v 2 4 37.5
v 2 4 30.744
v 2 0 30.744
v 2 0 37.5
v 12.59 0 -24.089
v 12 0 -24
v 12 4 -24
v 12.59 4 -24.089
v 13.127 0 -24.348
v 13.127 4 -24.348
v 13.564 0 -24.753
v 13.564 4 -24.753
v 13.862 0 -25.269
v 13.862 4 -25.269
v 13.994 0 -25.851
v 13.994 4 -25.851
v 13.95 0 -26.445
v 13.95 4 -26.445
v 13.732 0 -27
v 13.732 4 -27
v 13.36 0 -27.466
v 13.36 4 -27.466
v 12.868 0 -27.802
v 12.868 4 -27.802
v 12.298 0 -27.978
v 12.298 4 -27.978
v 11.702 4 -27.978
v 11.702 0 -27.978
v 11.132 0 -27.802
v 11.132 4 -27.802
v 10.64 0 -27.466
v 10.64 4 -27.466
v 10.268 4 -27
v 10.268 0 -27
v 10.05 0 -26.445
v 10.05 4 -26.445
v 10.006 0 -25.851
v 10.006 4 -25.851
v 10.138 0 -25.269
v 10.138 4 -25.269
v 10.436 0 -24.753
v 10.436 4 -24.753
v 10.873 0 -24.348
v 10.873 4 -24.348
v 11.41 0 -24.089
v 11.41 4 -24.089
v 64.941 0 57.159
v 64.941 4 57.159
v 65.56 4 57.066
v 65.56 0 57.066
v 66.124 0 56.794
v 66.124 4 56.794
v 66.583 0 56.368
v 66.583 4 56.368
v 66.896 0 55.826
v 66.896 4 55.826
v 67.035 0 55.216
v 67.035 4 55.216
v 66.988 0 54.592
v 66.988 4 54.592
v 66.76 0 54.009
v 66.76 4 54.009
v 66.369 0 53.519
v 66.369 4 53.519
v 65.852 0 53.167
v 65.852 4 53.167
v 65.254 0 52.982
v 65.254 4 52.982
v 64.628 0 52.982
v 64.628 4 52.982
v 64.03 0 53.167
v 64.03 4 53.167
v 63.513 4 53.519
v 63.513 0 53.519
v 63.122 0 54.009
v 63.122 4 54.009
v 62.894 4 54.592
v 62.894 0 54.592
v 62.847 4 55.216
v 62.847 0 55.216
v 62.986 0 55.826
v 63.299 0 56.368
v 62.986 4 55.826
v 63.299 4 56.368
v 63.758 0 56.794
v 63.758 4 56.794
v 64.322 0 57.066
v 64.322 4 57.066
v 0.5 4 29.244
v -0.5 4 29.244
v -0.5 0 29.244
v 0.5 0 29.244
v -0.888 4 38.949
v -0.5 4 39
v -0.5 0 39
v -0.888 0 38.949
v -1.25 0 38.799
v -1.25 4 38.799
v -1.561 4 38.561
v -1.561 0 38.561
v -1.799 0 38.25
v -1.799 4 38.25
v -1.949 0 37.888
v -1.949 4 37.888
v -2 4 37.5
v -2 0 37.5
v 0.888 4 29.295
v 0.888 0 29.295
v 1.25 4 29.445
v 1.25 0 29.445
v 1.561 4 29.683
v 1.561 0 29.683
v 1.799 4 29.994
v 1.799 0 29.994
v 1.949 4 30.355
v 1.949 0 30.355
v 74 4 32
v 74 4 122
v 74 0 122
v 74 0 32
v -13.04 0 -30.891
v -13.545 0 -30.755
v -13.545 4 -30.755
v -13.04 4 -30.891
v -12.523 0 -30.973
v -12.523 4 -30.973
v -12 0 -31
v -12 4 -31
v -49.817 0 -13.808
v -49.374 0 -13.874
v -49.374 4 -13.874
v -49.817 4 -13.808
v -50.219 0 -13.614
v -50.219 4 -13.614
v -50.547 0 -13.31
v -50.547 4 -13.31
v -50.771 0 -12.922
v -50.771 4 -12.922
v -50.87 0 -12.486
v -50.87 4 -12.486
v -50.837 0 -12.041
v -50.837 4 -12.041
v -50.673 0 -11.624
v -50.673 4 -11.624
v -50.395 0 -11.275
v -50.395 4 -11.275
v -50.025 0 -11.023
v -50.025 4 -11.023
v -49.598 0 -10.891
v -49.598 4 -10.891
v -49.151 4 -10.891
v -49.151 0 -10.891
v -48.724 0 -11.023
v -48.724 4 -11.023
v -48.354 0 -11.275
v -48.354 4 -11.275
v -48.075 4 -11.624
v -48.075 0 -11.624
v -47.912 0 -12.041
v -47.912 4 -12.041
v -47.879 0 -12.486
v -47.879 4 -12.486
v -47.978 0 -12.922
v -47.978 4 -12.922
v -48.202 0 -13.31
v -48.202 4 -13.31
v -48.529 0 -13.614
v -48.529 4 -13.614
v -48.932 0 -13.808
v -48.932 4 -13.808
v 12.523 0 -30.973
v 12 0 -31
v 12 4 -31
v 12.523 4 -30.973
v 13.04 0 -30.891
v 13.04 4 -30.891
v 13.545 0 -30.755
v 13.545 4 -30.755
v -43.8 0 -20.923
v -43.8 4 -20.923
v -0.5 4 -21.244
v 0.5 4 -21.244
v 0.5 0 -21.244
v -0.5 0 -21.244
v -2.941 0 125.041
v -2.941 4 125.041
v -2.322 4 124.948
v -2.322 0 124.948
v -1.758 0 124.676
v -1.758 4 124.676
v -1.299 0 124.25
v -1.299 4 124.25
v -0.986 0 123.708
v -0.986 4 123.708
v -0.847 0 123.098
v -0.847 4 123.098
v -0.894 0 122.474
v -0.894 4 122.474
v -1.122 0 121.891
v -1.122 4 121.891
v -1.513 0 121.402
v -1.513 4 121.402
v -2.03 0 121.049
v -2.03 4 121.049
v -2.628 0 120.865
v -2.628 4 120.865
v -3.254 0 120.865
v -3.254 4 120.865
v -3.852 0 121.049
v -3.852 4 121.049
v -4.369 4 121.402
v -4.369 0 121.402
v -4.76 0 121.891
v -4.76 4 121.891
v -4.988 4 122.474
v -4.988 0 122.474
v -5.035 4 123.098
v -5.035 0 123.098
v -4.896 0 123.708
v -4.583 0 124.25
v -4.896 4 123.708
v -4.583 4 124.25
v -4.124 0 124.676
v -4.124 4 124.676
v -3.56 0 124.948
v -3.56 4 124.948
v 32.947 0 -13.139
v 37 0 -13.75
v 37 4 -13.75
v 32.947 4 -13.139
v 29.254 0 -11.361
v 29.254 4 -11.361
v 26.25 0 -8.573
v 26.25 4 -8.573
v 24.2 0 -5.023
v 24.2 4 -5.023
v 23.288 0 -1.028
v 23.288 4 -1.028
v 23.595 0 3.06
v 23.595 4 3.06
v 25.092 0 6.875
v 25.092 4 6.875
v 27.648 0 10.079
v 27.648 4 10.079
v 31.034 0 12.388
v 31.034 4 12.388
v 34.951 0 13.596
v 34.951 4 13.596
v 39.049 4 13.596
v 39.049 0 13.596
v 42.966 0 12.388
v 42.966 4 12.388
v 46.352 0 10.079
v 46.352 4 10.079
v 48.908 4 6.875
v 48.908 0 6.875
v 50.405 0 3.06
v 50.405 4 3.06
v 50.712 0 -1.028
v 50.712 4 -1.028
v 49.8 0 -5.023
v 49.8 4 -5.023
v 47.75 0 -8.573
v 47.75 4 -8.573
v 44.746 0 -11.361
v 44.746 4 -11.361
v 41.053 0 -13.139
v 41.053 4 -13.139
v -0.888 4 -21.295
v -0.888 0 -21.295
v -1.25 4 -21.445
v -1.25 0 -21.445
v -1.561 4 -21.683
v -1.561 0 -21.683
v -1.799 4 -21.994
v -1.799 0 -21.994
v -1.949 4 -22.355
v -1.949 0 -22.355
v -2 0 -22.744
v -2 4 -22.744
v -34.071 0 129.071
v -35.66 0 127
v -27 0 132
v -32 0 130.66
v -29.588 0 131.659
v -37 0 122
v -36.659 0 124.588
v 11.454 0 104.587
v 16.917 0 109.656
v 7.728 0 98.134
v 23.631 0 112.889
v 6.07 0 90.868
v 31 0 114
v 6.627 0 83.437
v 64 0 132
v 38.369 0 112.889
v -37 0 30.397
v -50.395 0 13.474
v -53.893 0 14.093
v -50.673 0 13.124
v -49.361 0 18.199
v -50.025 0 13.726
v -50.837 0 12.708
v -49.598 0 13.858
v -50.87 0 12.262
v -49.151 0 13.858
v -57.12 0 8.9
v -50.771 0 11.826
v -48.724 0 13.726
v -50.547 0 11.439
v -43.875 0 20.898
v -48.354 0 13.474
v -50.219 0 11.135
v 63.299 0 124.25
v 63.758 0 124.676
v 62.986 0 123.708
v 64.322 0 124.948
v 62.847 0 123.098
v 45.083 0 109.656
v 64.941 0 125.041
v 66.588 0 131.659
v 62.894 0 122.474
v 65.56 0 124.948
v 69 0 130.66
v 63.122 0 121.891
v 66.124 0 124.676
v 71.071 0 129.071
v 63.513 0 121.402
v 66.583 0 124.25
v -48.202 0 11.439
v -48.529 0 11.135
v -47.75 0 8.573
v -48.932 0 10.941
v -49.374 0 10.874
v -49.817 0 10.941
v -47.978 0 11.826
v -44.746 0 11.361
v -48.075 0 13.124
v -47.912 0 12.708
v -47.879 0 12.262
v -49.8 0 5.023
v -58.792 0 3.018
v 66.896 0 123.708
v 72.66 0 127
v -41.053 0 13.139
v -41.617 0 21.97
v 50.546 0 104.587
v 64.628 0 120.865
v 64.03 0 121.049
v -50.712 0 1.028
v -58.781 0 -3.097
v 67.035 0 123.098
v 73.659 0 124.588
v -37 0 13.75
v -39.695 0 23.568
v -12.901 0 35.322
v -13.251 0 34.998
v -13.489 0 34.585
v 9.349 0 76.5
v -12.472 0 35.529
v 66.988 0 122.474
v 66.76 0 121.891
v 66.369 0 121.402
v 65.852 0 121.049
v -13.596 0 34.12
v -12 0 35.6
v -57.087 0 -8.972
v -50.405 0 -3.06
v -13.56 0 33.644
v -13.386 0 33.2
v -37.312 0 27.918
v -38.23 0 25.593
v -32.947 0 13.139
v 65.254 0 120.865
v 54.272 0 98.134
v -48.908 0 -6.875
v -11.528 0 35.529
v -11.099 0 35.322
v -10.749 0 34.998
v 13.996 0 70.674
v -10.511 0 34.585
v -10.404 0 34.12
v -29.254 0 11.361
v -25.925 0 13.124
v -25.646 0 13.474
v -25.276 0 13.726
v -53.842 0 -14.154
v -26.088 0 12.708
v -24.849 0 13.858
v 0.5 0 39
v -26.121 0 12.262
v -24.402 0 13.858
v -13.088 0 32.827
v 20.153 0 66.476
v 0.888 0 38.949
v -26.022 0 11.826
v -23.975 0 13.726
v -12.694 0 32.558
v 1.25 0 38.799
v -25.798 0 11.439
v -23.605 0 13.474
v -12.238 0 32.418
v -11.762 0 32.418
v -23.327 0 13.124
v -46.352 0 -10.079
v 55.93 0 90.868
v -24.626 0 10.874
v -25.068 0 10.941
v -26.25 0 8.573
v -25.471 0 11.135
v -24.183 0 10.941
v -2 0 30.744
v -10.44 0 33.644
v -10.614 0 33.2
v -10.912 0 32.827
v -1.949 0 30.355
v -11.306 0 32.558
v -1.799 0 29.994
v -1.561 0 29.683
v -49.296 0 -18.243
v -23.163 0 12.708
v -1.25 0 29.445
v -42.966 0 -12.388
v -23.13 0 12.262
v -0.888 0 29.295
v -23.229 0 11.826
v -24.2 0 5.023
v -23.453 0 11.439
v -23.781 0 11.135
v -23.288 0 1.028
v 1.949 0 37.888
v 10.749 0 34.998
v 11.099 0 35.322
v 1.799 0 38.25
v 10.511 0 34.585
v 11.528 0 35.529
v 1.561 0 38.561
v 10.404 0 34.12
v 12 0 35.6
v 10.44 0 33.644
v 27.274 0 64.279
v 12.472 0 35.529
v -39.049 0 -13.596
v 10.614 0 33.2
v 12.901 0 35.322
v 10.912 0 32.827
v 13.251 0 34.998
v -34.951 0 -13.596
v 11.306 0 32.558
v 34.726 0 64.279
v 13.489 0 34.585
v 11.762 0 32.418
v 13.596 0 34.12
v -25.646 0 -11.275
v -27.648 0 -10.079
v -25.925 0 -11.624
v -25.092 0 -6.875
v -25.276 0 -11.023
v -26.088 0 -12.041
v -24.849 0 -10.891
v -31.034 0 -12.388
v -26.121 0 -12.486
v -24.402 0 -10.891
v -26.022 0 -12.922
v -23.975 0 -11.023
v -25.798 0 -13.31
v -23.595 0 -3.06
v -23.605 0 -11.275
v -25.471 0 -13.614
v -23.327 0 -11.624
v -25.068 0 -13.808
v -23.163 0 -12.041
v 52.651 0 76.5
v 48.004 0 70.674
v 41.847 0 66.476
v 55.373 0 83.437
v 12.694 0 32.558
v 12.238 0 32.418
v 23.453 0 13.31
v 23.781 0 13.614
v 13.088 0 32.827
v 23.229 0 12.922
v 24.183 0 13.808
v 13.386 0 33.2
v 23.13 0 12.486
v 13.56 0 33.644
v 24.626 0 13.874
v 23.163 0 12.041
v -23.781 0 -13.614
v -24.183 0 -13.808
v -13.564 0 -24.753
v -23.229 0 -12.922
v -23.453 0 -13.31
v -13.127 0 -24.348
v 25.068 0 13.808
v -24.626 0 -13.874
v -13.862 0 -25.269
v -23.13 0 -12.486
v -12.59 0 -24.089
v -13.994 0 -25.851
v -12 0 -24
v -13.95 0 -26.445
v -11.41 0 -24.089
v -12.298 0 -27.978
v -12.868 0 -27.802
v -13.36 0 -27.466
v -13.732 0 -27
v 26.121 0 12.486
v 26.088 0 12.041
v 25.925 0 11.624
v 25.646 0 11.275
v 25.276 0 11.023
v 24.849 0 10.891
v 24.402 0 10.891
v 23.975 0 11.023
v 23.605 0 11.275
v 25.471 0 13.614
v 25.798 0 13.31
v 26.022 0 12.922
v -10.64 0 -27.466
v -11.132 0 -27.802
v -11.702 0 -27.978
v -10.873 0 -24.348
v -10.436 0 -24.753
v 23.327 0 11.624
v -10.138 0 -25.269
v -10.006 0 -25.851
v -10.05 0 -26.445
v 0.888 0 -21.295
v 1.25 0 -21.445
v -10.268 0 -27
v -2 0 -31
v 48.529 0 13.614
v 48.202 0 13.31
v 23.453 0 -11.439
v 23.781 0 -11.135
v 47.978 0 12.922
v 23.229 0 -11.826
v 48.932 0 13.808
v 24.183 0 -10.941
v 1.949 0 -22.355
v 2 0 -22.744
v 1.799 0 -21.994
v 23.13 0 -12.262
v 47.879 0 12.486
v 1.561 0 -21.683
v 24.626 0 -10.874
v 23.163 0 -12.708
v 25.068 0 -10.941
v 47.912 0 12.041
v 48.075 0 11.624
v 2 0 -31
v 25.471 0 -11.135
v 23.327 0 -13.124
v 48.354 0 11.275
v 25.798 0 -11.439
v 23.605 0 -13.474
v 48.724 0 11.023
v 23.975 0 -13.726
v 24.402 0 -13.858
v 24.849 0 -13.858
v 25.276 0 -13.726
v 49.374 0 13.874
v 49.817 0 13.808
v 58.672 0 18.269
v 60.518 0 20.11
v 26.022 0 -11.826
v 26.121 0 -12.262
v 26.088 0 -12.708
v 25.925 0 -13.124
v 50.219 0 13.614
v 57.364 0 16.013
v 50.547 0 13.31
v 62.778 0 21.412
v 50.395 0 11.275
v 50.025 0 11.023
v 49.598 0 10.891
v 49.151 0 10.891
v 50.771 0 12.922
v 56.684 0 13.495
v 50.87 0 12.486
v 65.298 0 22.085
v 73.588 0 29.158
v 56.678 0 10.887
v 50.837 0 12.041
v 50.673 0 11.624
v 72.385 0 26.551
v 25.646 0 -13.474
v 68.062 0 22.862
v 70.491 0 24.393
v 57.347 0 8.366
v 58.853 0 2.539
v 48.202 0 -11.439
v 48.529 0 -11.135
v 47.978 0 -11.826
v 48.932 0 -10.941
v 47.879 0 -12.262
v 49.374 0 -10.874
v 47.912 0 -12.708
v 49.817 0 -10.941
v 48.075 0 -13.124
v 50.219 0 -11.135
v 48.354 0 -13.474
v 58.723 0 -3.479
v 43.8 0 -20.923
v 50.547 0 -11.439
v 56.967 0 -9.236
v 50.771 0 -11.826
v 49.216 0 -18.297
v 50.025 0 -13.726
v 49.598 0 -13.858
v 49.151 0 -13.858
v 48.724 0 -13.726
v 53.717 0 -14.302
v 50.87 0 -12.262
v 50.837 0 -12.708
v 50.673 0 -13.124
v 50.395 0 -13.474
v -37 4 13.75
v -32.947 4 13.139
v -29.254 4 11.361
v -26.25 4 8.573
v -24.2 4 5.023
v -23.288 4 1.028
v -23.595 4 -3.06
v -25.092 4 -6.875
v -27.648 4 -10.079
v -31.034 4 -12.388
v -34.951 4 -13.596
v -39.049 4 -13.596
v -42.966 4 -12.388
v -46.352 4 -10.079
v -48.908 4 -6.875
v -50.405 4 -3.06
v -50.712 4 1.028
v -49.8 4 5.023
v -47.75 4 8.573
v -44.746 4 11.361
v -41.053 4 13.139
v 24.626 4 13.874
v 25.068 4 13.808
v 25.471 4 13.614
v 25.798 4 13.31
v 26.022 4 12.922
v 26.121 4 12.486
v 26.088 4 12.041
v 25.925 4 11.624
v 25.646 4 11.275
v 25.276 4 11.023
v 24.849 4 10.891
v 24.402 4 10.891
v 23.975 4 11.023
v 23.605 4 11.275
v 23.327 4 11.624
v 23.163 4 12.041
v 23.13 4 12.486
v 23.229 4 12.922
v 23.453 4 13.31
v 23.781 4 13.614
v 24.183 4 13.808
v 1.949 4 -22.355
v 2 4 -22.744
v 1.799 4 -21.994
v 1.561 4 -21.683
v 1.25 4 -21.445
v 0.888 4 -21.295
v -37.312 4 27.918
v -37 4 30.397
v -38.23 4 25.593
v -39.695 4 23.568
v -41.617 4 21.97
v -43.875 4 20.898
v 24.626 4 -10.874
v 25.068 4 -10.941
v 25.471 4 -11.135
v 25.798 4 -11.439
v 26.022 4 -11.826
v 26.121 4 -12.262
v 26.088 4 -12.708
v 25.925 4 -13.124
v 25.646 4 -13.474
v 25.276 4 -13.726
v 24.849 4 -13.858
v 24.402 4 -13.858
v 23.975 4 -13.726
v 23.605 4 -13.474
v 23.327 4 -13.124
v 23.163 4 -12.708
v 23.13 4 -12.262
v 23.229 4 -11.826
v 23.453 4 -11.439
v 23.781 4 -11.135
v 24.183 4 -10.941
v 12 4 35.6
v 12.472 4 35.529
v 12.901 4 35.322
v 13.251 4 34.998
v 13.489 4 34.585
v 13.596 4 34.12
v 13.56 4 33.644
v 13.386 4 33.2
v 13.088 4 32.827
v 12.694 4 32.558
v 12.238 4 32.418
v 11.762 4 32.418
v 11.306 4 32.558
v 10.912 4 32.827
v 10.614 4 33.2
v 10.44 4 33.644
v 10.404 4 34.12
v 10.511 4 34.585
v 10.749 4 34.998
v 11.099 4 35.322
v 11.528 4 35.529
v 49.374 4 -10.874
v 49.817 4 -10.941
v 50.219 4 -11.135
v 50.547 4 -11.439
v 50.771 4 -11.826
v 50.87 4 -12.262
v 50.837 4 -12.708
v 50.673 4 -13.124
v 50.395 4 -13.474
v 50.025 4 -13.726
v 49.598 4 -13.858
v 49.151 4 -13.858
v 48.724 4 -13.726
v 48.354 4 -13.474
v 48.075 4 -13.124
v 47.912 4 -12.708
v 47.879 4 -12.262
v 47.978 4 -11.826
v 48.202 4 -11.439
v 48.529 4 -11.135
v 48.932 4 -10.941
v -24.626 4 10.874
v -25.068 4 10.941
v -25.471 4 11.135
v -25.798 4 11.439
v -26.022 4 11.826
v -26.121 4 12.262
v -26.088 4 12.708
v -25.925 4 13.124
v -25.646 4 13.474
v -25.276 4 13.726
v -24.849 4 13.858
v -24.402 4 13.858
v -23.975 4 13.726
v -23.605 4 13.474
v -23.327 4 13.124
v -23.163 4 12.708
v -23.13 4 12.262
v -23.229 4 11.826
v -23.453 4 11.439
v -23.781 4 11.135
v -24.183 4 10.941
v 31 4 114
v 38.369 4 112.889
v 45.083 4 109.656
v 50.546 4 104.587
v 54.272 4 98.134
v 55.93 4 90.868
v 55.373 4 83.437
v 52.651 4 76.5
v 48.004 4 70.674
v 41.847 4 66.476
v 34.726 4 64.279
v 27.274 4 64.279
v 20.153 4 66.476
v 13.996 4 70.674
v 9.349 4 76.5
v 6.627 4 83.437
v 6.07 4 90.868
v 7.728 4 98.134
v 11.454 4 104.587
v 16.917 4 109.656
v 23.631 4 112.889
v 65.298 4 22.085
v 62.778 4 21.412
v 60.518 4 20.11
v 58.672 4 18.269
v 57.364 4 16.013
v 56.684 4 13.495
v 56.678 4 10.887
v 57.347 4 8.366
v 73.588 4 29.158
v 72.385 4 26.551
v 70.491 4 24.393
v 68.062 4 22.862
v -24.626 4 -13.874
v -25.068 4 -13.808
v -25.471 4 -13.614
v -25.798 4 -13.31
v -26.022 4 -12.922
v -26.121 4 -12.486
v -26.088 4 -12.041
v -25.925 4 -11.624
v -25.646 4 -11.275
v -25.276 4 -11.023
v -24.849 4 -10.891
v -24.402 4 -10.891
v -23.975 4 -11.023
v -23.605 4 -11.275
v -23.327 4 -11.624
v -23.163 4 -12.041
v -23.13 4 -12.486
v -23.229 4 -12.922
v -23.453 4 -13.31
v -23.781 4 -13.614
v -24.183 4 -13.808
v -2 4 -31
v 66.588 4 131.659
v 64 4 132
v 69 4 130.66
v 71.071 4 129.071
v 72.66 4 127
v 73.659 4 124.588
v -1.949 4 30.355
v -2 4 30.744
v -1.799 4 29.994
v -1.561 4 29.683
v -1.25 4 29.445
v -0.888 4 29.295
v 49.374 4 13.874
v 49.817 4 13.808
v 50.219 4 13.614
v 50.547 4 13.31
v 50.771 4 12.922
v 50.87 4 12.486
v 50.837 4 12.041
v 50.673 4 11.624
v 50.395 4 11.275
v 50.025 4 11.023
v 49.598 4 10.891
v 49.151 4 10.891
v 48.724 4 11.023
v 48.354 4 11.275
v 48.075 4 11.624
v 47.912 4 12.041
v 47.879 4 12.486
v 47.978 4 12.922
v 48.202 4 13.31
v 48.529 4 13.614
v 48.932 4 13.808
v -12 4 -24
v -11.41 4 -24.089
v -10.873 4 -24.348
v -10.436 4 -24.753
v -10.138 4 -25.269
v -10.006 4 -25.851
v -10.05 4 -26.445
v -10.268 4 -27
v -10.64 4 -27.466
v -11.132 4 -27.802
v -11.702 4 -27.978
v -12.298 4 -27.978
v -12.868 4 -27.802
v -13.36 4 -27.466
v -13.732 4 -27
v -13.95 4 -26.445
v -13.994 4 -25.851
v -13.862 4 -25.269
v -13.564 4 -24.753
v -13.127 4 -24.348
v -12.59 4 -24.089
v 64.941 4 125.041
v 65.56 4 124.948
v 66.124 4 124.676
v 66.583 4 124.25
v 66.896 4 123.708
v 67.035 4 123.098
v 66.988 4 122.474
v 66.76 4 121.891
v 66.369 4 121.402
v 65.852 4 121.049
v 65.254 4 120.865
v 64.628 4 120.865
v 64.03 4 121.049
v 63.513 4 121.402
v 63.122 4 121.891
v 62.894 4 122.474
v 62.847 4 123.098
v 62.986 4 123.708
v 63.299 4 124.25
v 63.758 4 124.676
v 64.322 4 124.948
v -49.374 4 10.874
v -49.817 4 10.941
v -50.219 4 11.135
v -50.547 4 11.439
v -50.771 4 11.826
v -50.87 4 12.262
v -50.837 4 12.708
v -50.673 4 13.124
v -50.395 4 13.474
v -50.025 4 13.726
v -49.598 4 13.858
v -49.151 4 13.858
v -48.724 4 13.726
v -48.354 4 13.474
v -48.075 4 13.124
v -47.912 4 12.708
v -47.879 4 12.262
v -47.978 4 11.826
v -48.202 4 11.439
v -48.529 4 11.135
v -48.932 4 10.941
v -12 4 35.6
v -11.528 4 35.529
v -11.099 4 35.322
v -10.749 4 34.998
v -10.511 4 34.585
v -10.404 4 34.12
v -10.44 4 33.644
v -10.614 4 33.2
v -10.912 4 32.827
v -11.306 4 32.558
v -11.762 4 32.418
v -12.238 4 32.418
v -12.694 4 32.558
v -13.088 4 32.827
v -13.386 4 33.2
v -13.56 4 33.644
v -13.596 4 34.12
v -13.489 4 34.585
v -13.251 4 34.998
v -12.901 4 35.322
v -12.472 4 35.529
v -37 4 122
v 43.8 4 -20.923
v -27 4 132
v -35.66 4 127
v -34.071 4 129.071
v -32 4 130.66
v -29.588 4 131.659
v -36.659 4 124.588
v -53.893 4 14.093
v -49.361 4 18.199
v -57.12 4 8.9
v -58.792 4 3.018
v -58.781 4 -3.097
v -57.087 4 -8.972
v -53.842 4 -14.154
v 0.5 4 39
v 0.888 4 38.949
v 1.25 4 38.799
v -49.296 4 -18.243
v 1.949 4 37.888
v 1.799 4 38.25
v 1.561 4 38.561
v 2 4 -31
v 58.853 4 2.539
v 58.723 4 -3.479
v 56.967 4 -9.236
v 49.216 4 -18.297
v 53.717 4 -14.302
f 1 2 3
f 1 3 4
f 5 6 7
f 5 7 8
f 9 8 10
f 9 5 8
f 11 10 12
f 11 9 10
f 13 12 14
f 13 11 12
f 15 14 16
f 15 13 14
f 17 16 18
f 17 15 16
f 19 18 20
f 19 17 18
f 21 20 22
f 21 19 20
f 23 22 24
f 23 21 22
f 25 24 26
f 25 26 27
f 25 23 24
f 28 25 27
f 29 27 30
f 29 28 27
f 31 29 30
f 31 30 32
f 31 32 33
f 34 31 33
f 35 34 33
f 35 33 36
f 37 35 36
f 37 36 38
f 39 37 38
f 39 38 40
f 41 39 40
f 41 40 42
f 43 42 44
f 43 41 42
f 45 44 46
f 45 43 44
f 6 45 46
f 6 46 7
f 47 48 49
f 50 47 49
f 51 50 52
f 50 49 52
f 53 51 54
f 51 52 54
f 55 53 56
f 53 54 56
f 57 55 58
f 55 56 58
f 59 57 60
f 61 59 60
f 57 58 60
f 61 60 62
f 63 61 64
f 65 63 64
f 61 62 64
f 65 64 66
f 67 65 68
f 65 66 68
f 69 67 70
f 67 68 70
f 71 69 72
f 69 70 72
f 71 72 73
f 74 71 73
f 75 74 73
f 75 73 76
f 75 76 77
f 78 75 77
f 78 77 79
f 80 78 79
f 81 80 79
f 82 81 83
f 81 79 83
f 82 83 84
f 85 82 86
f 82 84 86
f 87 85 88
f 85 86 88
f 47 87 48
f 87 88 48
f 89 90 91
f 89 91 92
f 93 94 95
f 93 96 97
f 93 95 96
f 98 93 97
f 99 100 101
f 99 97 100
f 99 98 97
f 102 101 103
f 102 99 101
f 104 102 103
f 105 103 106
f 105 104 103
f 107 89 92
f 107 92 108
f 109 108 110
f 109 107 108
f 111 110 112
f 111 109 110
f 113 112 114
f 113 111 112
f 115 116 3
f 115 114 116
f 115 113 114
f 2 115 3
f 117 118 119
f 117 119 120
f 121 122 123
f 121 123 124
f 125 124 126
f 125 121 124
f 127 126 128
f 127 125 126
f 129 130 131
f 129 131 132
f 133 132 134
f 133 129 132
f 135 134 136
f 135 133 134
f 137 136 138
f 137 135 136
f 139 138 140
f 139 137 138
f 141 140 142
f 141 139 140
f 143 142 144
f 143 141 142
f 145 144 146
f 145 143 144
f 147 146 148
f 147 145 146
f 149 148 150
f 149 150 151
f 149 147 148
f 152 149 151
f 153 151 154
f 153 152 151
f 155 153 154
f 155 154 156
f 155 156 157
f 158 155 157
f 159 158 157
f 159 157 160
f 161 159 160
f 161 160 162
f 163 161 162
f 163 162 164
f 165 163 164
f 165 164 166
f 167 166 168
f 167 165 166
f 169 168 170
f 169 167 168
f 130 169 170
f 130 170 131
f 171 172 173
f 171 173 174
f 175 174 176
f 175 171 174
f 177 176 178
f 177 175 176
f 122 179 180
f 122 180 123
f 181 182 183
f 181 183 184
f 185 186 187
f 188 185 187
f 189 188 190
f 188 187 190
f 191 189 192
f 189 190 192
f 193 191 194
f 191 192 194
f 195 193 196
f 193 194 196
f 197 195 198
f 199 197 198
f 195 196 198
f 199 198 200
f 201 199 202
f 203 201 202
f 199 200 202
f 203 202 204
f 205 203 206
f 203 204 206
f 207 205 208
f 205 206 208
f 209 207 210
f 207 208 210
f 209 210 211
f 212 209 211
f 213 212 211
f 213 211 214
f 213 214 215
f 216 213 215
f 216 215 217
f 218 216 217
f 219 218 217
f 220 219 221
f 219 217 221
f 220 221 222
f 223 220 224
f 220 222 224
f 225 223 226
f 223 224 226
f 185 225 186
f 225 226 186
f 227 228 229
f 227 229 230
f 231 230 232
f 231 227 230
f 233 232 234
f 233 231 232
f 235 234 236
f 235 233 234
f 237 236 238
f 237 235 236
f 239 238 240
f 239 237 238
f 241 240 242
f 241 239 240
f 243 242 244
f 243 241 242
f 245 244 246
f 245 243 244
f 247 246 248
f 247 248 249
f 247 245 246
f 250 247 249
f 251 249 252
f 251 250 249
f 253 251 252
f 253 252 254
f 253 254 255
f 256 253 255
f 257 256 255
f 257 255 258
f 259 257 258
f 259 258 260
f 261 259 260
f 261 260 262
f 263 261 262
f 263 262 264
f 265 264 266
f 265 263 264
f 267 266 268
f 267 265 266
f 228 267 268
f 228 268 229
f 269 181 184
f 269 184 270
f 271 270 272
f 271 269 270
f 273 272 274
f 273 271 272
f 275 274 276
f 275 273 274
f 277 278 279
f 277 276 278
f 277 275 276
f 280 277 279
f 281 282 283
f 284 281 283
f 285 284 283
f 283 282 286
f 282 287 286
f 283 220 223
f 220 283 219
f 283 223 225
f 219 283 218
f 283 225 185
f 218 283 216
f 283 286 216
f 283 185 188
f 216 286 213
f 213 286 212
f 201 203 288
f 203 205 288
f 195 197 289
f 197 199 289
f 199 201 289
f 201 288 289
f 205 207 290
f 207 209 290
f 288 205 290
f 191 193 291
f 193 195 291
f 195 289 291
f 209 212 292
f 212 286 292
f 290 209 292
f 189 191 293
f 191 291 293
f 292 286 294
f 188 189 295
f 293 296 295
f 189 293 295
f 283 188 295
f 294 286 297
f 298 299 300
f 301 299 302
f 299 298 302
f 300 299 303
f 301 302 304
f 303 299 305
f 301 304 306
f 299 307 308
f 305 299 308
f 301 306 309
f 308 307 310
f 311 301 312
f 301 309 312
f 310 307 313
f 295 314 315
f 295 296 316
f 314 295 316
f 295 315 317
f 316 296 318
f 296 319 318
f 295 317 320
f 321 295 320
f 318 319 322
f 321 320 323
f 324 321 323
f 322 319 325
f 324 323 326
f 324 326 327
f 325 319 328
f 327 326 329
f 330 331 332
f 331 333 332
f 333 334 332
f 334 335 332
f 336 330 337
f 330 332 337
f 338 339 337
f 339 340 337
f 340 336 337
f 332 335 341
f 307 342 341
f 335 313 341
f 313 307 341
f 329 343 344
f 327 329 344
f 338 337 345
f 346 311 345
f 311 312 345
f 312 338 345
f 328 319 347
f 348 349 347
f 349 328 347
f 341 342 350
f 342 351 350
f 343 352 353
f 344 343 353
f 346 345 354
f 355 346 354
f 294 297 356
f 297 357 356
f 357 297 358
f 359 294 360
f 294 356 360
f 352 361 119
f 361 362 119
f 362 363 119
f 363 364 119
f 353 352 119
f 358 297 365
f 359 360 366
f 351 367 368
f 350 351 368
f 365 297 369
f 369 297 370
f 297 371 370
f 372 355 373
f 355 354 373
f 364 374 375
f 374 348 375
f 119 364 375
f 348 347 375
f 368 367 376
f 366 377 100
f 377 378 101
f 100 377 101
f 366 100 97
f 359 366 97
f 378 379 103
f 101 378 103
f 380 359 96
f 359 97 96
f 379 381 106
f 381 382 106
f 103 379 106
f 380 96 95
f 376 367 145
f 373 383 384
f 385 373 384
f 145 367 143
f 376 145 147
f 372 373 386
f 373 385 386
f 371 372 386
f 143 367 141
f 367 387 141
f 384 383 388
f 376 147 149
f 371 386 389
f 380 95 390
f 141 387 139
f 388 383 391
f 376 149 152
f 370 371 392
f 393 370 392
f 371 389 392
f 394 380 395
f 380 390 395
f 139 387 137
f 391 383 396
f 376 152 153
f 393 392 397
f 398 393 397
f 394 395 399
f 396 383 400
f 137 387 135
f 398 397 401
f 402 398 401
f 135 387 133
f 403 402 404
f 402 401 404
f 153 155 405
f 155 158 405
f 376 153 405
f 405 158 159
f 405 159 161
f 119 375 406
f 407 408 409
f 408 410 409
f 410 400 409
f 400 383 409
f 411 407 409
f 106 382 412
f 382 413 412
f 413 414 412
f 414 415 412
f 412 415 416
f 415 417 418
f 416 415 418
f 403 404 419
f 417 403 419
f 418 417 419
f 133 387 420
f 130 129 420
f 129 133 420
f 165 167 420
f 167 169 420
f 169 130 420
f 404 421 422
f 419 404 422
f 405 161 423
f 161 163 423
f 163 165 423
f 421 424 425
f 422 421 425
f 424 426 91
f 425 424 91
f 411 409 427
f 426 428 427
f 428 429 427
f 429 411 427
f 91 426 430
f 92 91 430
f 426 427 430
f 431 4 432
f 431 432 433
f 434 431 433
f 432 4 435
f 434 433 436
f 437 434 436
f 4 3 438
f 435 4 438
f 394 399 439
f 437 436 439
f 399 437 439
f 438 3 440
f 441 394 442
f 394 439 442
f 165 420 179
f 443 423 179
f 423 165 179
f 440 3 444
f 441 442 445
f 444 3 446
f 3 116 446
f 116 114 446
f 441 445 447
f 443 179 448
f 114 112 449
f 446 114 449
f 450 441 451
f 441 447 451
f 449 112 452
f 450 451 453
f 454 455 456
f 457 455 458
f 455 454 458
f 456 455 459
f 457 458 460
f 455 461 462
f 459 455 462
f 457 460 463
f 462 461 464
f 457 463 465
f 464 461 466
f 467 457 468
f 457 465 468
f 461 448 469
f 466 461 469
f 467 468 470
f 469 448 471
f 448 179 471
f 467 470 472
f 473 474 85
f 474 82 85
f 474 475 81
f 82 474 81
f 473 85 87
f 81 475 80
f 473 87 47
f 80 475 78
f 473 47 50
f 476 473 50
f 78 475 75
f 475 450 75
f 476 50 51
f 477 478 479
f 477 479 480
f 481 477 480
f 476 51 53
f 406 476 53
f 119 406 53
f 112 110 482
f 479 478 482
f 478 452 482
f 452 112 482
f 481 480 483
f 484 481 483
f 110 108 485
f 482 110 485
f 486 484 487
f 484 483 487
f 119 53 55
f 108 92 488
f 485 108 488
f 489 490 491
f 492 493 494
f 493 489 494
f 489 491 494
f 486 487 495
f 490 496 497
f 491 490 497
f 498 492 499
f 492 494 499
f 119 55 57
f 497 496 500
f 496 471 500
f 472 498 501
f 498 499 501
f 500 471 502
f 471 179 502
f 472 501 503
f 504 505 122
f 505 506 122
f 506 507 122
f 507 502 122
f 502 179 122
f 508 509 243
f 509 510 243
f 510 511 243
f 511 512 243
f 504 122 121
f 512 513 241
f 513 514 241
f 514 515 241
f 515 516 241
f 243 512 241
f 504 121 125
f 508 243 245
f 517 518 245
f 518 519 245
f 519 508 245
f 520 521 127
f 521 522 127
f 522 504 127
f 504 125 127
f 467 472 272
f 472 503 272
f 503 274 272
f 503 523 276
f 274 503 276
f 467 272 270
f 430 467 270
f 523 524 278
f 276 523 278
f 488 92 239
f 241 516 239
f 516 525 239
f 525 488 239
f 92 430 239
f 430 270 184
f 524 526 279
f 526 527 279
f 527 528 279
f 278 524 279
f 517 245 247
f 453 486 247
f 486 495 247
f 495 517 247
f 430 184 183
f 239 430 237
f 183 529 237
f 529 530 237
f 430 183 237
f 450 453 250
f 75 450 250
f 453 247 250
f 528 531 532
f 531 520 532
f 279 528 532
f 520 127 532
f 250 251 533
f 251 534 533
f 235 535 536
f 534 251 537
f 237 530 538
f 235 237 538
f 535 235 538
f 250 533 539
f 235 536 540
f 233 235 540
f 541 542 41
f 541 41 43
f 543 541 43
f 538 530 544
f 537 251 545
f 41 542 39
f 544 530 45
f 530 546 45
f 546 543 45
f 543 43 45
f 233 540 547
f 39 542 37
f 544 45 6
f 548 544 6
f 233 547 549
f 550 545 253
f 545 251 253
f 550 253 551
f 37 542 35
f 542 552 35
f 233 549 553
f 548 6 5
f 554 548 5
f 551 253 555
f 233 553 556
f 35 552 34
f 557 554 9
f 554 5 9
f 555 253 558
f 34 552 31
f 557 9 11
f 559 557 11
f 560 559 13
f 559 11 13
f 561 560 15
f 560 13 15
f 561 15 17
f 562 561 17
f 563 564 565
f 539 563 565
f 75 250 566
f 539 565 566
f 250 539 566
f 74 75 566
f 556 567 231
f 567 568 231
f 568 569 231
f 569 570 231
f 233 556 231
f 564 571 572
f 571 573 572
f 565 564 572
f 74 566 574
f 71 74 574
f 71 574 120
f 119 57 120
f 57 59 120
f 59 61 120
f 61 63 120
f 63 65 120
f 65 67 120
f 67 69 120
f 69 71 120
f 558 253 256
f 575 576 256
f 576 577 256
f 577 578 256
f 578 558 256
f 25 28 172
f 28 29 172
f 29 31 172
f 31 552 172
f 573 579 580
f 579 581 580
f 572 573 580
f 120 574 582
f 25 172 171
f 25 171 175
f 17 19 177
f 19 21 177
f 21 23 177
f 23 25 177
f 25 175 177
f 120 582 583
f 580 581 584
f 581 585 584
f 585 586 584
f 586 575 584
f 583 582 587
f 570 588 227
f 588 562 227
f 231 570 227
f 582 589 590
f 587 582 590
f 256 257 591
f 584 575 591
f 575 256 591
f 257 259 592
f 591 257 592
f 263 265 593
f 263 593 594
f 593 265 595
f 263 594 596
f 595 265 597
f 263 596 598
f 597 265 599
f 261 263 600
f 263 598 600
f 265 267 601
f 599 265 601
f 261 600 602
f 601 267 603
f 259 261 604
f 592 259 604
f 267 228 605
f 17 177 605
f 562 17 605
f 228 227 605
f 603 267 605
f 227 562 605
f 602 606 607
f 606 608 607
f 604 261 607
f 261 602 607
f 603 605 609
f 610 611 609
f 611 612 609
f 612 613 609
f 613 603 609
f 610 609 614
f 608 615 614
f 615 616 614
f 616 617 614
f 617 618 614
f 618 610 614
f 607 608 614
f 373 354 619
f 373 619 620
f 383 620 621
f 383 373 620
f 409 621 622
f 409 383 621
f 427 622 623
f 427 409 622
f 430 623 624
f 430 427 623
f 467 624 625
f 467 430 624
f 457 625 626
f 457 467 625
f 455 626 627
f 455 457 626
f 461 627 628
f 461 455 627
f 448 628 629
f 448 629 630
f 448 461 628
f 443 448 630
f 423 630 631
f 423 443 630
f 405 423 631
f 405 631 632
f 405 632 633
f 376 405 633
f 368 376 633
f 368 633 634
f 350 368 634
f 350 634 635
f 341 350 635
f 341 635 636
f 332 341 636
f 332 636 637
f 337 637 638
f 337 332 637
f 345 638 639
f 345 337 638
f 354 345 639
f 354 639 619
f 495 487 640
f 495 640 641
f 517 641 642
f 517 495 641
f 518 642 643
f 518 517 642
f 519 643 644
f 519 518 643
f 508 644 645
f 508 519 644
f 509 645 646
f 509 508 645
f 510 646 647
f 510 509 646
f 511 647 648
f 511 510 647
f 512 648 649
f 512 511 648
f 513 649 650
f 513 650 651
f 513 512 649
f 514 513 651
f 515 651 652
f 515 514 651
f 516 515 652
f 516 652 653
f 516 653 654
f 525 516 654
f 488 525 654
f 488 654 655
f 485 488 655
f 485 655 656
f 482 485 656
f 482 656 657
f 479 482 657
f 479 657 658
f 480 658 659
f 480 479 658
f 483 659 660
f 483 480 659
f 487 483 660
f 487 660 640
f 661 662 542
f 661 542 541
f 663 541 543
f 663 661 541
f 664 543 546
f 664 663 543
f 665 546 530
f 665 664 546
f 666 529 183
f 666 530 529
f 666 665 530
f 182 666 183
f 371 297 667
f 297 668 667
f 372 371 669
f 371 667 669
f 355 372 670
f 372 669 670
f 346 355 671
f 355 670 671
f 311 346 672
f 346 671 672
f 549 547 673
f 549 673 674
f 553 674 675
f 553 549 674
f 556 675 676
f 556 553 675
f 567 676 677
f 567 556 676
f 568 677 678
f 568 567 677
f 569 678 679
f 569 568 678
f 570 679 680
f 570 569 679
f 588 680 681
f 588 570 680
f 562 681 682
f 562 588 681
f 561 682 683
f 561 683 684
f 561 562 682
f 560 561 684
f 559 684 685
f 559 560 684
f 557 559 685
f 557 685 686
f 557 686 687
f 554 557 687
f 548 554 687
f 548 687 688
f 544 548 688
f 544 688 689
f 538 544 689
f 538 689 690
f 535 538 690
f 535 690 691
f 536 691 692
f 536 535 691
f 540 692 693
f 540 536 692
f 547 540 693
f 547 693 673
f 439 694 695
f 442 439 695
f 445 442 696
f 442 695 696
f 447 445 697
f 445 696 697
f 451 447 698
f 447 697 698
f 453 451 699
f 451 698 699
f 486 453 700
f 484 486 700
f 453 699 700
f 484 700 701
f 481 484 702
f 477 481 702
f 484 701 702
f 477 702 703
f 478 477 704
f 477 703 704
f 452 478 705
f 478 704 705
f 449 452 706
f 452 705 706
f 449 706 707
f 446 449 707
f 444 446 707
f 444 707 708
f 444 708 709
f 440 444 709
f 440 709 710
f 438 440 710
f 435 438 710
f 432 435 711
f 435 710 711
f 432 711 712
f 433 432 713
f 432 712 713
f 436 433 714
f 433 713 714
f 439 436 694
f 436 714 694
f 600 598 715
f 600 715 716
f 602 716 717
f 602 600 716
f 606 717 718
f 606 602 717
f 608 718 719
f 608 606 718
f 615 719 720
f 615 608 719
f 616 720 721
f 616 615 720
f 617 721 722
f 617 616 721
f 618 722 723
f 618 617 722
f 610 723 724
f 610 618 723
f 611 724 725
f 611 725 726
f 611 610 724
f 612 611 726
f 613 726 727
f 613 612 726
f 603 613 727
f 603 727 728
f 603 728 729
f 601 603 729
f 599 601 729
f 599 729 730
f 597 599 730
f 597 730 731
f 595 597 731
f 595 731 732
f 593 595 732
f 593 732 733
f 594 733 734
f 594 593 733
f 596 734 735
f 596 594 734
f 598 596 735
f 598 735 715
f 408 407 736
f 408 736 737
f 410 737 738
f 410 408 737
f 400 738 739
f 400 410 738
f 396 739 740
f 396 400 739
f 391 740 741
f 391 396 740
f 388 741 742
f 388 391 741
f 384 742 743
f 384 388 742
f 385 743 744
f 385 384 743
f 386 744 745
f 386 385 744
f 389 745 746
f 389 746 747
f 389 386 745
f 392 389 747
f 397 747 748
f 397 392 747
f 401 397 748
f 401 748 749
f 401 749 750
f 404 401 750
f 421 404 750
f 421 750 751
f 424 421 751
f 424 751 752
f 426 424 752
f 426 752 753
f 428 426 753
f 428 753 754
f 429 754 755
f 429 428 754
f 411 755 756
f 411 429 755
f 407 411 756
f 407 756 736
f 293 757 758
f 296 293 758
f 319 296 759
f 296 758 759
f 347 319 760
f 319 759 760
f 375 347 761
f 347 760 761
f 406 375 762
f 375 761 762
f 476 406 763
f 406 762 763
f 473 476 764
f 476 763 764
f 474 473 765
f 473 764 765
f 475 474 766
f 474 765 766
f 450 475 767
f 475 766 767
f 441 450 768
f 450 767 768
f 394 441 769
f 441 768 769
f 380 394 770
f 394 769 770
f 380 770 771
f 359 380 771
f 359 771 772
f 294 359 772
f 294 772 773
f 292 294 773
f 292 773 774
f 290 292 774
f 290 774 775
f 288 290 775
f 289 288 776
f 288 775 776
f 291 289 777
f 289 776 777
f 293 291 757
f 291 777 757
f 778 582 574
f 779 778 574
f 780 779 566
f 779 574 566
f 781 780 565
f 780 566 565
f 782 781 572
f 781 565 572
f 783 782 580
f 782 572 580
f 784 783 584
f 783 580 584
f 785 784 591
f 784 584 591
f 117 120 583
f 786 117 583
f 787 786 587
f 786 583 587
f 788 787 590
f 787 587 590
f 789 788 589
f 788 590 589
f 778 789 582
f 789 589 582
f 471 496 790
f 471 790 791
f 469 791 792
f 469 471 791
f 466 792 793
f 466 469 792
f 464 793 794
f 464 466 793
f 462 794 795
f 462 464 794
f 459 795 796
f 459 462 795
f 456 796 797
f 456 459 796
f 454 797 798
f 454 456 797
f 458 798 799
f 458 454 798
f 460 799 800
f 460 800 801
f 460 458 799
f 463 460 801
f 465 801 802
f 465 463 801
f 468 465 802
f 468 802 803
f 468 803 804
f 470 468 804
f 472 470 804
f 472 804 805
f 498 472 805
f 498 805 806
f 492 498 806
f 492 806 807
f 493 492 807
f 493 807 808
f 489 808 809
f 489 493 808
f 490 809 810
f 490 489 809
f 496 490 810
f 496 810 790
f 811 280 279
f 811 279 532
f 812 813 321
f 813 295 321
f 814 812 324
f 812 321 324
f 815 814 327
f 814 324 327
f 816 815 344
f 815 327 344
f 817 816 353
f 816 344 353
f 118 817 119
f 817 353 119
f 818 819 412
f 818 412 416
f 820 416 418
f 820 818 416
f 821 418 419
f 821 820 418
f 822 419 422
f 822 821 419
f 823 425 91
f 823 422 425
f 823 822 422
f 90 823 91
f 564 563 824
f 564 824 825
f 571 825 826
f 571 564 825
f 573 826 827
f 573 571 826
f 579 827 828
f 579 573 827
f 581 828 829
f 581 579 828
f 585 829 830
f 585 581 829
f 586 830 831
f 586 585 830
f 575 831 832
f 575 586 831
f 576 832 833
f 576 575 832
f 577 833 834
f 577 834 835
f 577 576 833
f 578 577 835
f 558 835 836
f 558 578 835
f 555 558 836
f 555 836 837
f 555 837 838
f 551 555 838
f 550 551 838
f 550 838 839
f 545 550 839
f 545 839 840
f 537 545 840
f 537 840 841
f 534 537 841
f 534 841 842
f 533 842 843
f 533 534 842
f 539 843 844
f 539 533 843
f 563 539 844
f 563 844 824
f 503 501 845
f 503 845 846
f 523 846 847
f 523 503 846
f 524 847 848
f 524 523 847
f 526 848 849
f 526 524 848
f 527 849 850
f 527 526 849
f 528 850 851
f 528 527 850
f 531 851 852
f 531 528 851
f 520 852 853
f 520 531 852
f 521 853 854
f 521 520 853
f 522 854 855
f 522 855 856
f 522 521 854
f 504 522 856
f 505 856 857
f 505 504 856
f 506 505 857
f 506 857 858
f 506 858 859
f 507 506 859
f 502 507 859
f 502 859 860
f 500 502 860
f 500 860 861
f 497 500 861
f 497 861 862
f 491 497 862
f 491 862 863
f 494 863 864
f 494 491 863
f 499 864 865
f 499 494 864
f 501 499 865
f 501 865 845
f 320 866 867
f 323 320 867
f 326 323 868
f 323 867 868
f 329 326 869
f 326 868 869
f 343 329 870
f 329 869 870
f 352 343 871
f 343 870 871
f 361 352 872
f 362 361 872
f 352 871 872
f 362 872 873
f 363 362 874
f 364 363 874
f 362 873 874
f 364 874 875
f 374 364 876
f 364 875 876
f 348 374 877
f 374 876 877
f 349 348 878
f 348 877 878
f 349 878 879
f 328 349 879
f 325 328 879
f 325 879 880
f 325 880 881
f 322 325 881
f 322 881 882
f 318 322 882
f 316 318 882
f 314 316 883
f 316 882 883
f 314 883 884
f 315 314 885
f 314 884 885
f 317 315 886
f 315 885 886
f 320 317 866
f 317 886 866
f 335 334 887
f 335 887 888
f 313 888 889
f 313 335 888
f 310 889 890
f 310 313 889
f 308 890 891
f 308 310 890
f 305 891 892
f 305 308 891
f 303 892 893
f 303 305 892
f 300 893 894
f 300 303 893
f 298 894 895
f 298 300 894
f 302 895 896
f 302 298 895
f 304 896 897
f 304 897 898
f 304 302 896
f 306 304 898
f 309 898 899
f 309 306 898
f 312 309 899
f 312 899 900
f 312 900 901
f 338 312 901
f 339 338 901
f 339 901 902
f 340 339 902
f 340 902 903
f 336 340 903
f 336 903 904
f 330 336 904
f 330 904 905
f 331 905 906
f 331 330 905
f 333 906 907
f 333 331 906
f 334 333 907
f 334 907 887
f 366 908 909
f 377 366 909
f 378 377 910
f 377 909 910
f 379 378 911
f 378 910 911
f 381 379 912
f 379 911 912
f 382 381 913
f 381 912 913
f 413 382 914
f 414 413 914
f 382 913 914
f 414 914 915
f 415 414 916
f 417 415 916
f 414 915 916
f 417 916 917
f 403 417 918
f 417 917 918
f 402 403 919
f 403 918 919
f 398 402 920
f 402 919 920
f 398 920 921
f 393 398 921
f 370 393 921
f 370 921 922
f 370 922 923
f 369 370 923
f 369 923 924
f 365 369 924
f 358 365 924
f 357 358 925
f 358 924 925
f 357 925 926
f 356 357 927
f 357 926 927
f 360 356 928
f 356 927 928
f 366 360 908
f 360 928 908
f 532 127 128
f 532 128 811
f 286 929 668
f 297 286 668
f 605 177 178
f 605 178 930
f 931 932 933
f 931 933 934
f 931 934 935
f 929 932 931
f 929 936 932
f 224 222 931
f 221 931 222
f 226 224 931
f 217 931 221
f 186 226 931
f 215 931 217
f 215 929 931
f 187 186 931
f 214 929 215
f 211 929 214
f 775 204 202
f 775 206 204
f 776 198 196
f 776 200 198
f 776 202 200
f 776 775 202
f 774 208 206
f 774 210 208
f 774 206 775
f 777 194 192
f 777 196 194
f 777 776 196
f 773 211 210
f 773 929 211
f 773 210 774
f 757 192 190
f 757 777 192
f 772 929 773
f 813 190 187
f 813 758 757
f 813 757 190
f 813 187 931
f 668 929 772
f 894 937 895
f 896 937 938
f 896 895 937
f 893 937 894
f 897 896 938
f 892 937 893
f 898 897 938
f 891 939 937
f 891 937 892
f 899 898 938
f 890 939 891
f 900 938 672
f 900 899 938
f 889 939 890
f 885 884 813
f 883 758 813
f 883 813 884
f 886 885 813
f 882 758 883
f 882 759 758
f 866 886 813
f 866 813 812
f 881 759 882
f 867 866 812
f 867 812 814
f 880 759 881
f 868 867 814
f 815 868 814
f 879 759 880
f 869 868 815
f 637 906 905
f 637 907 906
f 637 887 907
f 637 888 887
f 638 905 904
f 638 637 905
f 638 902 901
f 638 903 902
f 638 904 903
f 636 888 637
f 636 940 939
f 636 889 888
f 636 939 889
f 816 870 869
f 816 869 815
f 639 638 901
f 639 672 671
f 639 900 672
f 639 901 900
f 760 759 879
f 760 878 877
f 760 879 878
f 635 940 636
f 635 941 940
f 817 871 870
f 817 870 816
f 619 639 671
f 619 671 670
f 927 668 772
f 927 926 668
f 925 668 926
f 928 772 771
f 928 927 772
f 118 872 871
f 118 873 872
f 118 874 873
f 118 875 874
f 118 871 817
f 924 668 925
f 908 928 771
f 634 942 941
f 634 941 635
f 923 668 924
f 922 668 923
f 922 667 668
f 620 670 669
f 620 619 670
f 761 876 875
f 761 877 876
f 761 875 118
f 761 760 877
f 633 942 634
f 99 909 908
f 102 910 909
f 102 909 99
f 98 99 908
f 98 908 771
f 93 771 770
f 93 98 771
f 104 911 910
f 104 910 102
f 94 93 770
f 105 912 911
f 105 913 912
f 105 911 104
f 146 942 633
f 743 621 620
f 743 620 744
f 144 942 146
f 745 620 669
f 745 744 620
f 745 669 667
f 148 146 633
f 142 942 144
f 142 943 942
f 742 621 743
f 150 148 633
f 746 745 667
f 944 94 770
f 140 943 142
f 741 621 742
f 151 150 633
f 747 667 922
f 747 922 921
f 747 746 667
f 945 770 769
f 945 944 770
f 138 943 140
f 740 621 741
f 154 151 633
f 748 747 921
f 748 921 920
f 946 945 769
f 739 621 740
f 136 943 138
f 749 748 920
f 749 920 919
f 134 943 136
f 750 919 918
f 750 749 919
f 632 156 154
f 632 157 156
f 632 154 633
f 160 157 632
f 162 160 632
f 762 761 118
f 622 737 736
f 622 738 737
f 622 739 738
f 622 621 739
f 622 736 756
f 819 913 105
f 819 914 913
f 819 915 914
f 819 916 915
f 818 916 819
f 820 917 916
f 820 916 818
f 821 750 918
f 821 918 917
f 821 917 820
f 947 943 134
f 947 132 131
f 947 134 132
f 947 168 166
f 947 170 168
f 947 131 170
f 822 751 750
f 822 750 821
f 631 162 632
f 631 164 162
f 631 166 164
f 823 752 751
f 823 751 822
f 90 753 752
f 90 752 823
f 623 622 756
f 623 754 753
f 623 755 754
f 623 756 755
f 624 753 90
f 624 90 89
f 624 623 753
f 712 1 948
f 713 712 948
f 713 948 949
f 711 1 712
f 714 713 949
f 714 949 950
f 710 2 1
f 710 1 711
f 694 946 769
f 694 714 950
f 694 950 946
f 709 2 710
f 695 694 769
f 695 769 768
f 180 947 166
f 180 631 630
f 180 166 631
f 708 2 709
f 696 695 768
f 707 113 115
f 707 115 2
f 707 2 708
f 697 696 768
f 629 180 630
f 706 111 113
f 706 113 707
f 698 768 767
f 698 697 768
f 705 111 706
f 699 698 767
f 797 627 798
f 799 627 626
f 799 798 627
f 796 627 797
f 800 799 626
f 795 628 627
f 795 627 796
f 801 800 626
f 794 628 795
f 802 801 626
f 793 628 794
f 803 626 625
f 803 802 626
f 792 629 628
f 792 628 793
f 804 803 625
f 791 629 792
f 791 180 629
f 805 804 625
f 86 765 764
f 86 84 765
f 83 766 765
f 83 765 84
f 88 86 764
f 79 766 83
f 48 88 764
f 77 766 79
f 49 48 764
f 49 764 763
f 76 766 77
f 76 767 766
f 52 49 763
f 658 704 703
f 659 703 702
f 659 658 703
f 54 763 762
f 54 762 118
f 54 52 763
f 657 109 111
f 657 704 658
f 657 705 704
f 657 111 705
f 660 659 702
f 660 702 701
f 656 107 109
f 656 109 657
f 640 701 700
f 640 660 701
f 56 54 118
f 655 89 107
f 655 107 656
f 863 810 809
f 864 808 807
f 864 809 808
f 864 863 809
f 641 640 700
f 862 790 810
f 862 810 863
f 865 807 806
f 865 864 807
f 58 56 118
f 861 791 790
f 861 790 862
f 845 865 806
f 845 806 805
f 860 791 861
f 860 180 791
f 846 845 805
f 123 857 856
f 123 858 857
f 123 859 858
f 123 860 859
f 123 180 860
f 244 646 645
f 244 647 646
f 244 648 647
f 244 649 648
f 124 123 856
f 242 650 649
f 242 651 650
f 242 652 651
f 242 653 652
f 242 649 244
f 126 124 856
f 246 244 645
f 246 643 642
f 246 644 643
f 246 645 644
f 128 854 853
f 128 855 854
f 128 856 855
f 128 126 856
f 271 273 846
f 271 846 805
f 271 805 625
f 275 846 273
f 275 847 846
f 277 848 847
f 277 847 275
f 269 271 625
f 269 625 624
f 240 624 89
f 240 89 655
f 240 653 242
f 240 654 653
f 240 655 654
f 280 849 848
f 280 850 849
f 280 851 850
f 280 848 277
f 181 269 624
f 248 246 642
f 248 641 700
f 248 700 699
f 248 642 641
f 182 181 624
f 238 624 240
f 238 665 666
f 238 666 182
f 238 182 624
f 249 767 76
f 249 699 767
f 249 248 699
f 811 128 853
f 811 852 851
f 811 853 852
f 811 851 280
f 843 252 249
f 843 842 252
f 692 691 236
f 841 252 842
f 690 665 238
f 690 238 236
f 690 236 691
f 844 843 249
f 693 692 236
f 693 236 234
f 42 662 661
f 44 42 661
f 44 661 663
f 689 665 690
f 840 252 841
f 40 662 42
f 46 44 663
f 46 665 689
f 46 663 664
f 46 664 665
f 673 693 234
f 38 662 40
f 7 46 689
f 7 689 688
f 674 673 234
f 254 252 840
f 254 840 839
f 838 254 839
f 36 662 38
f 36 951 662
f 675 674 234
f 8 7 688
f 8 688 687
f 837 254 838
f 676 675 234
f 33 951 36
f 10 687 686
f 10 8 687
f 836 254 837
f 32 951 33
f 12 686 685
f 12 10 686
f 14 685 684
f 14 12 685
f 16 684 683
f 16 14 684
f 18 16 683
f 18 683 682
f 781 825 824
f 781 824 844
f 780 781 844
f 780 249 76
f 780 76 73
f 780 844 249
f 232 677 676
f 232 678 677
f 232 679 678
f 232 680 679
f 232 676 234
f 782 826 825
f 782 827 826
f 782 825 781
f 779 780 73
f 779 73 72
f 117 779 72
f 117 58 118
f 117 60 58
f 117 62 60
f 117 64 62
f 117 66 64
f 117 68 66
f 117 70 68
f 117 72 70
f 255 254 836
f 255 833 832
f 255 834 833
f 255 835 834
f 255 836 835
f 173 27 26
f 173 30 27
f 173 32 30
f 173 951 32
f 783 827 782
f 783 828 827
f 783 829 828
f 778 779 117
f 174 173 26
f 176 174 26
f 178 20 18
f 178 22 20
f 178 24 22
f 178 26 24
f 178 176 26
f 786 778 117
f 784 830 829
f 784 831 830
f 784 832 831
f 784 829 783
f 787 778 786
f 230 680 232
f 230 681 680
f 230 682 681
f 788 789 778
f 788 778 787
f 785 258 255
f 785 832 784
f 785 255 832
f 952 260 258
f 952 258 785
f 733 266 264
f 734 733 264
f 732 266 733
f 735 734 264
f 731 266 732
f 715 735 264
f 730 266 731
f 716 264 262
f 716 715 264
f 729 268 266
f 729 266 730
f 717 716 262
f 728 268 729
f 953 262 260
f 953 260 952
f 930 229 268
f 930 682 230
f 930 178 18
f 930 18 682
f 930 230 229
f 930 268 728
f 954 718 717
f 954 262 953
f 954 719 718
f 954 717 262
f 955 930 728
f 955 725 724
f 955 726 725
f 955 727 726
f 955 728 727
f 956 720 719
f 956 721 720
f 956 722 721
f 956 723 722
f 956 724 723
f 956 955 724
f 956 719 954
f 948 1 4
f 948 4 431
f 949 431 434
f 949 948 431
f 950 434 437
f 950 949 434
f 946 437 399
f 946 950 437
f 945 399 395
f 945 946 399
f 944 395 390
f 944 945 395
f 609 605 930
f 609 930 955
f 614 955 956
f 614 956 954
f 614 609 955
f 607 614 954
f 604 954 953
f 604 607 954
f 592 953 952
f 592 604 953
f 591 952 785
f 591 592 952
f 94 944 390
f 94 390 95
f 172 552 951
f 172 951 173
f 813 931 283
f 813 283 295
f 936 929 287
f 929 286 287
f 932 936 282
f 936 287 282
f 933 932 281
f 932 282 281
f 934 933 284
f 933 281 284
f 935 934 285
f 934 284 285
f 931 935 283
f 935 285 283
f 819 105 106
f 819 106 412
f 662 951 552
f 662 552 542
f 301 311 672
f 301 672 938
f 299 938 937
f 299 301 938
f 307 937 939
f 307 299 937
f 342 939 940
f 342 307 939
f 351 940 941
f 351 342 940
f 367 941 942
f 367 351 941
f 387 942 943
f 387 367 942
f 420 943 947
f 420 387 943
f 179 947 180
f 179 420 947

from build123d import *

# Parameters (mm, degrees)
SKETCH_1_R          = 2
SKETCH_1_R_2        = 1.5
SKETCH_1_R_3        = 13.75
EXTRUDE_1_DEPTH     = 4
SKETCH1_W           = 111
SKETCH1_H           = 110
SKETCH1_R           = 1.6
SKETCH1_R_2         = 2.1
SKETCH1_R_3         = 25
BOSS_EXTRUDE1_DEPTH = 4
FILLET1_R           = 10
FILLET2_DEPTH       = 4
CUT_EXTRUDE1_DEPTH  = 10


with BuildPart() as part:
    # 草图1 → 凸台-拉伸1 (new body)
    with BuildSketch(Plane(origin=(0, 0, 0), x_dir=(1, 0, 0), z_dir=(0, 1, 0))):
        with BuildLine():
            Line((-43.799718629, 20.922806374), (-13.545390598, 30.755183267))
            ThreePointArc((-13.545390598, 30.755183267), (-12.782331025, 30.938416565), (-12, 31))
            Line((-12, 31), (12, 31))
            ThreePointArc((12, 31), (12.782331025, 30.938416565), (13.545390598, 30.755183267))
            Line((13.545390598, 30.755183267), (43.799718629, 20.922806374))
            ThreePointArc((43.799718629, 20.922806374), (58.729032885, -3.442256511), (37, -22))
            Line((37, -22), (-37, -22))
            ThreePointArc((-37, -22), (-58.729032885, -3.442256511), (-43.799718629, 20.922806374))
        make_face()
        with Locations(Location((-12, 26, 0), (0, 0, 270))):
            Circle(SKETCH_1_R, mode=Mode.SUBTRACT)
        with Locations(Location((12, 26, 0), (0, 0, 270))):
            Circle(SKETCH_1_R, mode=Mode.SUBTRACT)
        with Locations(Location((49.374368671, 12.374368671, 0), (0, 0, 270))):
            Circle(SKETCH_1_R_2, mode=Mode.SUBTRACT)
        with Locations(Location((49.374368671, -12.374368671, 0), (0, 0, 270))):
            Circle(SKETCH_1_R_2, mode=Mode.SUBTRACT)
        with Locations(Location((24.625631329, -12.374368671, 0), (0, 0, 270))):
            Circle(SKETCH_1_R_2, mode=Mode.SUBTRACT)
        with Locations(Location((24.625631329, 12.374368671, 0), (0, 0, 270))):
            Circle(SKETCH_1_R_2, mode=Mode.SUBTRACT)
        with Locations(Location((-49.374368671, -12.374368671, 0), (0, 0, 90))):
            Circle(SKETCH_1_R_2, mode=Mode.SUBTRACT)
        with Locations(Location((-24.625631329, -12.374368671, 0), (0, 0, 90))):
            Circle(SKETCH_1_R_2, mode=Mode.SUBTRACT)
        with Locations(Location((-49.374368671, 12.374368671, 0), (0, 0, 90))):
            Circle(SKETCH_1_R_2, mode=Mode.SUBTRACT)
        with Locations(Location((-24.625631329, 12.374368671, 0), (0, 0, 90))):
            Circle(SKETCH_1_R_2, mode=Mode.SUBTRACT)
        with Locations(Location((-37, 0, 0), (0, 0, 270))):
            Circle(SKETCH_1_R_3, mode=Mode.SUBTRACT)
        with Locations(Location((37, 0, 0), (0, 0, 90))):
            Circle(SKETCH_1_R_3, mode=Mode.SUBTRACT)
    extrude(amount=EXTRUDE_1_DEPTH)

    # Sketch1 → Boss-Extrude1 (add)
    with BuildSketch(Plane(origin=(0, 4, 0), x_dir=(1, 0, 0), z_dir=(0, 1, 0))):
        with Locations((18.5, -77)):
            Rectangle(SKETCH1_W, SKETCH1_H)
        with Locations(Location((12, -34, 0), (0, 0, 270))):
            Circle(SKETCH1_R, mode=Mode.SUBTRACT)
        with Locations(Location((-12, -34, 0), (0, 0, 270))):
            Circle(SKETCH1_R, mode=Mode.SUBTRACT)
        with Locations(Location((-2.941125497, -122.941125497, 0), (0, 0, 270))):
            Circle(SKETCH1_R_2, mode=Mode.SUBTRACT)
        with Locations(Location((64.941125497, -122.941125497, 0), (0, 0, 270))):
            Circle(SKETCH1_R_2, mode=Mode.SUBTRACT)
        with Locations(Location((64.941125497, -55.058874503, 0), (0, 0, 270))):
            Circle(SKETCH1_R_2, mode=Mode.SUBTRACT)
        with Locations(Location((31, -89, 0), (0, 0, 270))):
            Circle(SKETCH1_R_3, mode=Mode.SUBTRACT)
    extrude(amount=-BOSS_EXTRUDE1_DEPTH)

    # Fillet1
    fillet1_edges = [part.edges().sort_by_distance(p)[0] for p in [
        (-37, 2, 22),
        (-37, 2, 132),
        (74, 2, 22),
        (74, 2, 132),
    ]]
    fillet(fillet1_edges, radius=FILLET1_R)

    # Fillet2: read off the stored shape, not the designer's step
    # Fillet2 outline → Fillet2 (add)
    with BuildSketch(Plane(origin=(0, 0, 0), x_dir=(1, 0, 0), z_dir=(0, 1, 0))):
        with BuildLine():
            ThreePointArc((65.297899409, -22.084584874), (57.943895671, -17.183606101), (57.347111687, -8.366304201))
            ThreePointArc((57.347111687, -8.366304201), (49.246250601, -18.276469742), (37, -22))
            Line((37, -22), (64, -22))
            ThreePointArc((64, -22), (64.650326356, -22.021168624), (65.297899409, -22.084584874))
        make_face()
    extrude(amount=FILLET2_DEPTH)

    # Sketch2 → Cut-Extrude1 (cut)
    with BuildSketch(Plane(origin=(0, 4, 0), x_dir=(1, 0, 0), z_dir=(0, 1, 0))):
        with BuildLine():
            Line((-2, 31), (2, 31))
            Line((2, 31), (2, 22.743593539))
            ThreePointArc((2, 22.743593539), (1.560660172, 21.682933368), (0.5, 21.243593539))
            Line((0.5, 21.243593539), (-0.5, 21.243593539))
            ThreePointArc((-0.5, 21.243593539), (-1.560660172, 21.682933368), (-2, 22.743593539))
            Line((-2, 22.743593539), (-2, 31))
        make_face()
        with BuildLine():
            Line((-0.5, -29.243593539), (0.5, -29.243593539))
            ThreePointArc((0.5, -29.243593539), (1.560660172, -29.682933368), (2, -30.743593539))
            Line((2, -30.743593539), (2, -37.5))
            ThreePointArc((2, -37.5), (1.560660172, -38.560660172), (0.5, -39))
            Line((0.5, -39), (-0.5, -39))
            ThreePointArc((-0.5, -39), (-1.560660172, -38.560660172), (-2, -37.5))
            Line((-2, -37.5), (-2, -30.743593539))
            ThreePointArc((-2, -30.743593539), (-1.560660172, -29.682933368), (-0.5, -29.243593539))
        make_face()
    extrude(amount=-CUT_EXTRUDE1_DEPTH, mode=Mode.SUBTRACT)


solid = part.part
